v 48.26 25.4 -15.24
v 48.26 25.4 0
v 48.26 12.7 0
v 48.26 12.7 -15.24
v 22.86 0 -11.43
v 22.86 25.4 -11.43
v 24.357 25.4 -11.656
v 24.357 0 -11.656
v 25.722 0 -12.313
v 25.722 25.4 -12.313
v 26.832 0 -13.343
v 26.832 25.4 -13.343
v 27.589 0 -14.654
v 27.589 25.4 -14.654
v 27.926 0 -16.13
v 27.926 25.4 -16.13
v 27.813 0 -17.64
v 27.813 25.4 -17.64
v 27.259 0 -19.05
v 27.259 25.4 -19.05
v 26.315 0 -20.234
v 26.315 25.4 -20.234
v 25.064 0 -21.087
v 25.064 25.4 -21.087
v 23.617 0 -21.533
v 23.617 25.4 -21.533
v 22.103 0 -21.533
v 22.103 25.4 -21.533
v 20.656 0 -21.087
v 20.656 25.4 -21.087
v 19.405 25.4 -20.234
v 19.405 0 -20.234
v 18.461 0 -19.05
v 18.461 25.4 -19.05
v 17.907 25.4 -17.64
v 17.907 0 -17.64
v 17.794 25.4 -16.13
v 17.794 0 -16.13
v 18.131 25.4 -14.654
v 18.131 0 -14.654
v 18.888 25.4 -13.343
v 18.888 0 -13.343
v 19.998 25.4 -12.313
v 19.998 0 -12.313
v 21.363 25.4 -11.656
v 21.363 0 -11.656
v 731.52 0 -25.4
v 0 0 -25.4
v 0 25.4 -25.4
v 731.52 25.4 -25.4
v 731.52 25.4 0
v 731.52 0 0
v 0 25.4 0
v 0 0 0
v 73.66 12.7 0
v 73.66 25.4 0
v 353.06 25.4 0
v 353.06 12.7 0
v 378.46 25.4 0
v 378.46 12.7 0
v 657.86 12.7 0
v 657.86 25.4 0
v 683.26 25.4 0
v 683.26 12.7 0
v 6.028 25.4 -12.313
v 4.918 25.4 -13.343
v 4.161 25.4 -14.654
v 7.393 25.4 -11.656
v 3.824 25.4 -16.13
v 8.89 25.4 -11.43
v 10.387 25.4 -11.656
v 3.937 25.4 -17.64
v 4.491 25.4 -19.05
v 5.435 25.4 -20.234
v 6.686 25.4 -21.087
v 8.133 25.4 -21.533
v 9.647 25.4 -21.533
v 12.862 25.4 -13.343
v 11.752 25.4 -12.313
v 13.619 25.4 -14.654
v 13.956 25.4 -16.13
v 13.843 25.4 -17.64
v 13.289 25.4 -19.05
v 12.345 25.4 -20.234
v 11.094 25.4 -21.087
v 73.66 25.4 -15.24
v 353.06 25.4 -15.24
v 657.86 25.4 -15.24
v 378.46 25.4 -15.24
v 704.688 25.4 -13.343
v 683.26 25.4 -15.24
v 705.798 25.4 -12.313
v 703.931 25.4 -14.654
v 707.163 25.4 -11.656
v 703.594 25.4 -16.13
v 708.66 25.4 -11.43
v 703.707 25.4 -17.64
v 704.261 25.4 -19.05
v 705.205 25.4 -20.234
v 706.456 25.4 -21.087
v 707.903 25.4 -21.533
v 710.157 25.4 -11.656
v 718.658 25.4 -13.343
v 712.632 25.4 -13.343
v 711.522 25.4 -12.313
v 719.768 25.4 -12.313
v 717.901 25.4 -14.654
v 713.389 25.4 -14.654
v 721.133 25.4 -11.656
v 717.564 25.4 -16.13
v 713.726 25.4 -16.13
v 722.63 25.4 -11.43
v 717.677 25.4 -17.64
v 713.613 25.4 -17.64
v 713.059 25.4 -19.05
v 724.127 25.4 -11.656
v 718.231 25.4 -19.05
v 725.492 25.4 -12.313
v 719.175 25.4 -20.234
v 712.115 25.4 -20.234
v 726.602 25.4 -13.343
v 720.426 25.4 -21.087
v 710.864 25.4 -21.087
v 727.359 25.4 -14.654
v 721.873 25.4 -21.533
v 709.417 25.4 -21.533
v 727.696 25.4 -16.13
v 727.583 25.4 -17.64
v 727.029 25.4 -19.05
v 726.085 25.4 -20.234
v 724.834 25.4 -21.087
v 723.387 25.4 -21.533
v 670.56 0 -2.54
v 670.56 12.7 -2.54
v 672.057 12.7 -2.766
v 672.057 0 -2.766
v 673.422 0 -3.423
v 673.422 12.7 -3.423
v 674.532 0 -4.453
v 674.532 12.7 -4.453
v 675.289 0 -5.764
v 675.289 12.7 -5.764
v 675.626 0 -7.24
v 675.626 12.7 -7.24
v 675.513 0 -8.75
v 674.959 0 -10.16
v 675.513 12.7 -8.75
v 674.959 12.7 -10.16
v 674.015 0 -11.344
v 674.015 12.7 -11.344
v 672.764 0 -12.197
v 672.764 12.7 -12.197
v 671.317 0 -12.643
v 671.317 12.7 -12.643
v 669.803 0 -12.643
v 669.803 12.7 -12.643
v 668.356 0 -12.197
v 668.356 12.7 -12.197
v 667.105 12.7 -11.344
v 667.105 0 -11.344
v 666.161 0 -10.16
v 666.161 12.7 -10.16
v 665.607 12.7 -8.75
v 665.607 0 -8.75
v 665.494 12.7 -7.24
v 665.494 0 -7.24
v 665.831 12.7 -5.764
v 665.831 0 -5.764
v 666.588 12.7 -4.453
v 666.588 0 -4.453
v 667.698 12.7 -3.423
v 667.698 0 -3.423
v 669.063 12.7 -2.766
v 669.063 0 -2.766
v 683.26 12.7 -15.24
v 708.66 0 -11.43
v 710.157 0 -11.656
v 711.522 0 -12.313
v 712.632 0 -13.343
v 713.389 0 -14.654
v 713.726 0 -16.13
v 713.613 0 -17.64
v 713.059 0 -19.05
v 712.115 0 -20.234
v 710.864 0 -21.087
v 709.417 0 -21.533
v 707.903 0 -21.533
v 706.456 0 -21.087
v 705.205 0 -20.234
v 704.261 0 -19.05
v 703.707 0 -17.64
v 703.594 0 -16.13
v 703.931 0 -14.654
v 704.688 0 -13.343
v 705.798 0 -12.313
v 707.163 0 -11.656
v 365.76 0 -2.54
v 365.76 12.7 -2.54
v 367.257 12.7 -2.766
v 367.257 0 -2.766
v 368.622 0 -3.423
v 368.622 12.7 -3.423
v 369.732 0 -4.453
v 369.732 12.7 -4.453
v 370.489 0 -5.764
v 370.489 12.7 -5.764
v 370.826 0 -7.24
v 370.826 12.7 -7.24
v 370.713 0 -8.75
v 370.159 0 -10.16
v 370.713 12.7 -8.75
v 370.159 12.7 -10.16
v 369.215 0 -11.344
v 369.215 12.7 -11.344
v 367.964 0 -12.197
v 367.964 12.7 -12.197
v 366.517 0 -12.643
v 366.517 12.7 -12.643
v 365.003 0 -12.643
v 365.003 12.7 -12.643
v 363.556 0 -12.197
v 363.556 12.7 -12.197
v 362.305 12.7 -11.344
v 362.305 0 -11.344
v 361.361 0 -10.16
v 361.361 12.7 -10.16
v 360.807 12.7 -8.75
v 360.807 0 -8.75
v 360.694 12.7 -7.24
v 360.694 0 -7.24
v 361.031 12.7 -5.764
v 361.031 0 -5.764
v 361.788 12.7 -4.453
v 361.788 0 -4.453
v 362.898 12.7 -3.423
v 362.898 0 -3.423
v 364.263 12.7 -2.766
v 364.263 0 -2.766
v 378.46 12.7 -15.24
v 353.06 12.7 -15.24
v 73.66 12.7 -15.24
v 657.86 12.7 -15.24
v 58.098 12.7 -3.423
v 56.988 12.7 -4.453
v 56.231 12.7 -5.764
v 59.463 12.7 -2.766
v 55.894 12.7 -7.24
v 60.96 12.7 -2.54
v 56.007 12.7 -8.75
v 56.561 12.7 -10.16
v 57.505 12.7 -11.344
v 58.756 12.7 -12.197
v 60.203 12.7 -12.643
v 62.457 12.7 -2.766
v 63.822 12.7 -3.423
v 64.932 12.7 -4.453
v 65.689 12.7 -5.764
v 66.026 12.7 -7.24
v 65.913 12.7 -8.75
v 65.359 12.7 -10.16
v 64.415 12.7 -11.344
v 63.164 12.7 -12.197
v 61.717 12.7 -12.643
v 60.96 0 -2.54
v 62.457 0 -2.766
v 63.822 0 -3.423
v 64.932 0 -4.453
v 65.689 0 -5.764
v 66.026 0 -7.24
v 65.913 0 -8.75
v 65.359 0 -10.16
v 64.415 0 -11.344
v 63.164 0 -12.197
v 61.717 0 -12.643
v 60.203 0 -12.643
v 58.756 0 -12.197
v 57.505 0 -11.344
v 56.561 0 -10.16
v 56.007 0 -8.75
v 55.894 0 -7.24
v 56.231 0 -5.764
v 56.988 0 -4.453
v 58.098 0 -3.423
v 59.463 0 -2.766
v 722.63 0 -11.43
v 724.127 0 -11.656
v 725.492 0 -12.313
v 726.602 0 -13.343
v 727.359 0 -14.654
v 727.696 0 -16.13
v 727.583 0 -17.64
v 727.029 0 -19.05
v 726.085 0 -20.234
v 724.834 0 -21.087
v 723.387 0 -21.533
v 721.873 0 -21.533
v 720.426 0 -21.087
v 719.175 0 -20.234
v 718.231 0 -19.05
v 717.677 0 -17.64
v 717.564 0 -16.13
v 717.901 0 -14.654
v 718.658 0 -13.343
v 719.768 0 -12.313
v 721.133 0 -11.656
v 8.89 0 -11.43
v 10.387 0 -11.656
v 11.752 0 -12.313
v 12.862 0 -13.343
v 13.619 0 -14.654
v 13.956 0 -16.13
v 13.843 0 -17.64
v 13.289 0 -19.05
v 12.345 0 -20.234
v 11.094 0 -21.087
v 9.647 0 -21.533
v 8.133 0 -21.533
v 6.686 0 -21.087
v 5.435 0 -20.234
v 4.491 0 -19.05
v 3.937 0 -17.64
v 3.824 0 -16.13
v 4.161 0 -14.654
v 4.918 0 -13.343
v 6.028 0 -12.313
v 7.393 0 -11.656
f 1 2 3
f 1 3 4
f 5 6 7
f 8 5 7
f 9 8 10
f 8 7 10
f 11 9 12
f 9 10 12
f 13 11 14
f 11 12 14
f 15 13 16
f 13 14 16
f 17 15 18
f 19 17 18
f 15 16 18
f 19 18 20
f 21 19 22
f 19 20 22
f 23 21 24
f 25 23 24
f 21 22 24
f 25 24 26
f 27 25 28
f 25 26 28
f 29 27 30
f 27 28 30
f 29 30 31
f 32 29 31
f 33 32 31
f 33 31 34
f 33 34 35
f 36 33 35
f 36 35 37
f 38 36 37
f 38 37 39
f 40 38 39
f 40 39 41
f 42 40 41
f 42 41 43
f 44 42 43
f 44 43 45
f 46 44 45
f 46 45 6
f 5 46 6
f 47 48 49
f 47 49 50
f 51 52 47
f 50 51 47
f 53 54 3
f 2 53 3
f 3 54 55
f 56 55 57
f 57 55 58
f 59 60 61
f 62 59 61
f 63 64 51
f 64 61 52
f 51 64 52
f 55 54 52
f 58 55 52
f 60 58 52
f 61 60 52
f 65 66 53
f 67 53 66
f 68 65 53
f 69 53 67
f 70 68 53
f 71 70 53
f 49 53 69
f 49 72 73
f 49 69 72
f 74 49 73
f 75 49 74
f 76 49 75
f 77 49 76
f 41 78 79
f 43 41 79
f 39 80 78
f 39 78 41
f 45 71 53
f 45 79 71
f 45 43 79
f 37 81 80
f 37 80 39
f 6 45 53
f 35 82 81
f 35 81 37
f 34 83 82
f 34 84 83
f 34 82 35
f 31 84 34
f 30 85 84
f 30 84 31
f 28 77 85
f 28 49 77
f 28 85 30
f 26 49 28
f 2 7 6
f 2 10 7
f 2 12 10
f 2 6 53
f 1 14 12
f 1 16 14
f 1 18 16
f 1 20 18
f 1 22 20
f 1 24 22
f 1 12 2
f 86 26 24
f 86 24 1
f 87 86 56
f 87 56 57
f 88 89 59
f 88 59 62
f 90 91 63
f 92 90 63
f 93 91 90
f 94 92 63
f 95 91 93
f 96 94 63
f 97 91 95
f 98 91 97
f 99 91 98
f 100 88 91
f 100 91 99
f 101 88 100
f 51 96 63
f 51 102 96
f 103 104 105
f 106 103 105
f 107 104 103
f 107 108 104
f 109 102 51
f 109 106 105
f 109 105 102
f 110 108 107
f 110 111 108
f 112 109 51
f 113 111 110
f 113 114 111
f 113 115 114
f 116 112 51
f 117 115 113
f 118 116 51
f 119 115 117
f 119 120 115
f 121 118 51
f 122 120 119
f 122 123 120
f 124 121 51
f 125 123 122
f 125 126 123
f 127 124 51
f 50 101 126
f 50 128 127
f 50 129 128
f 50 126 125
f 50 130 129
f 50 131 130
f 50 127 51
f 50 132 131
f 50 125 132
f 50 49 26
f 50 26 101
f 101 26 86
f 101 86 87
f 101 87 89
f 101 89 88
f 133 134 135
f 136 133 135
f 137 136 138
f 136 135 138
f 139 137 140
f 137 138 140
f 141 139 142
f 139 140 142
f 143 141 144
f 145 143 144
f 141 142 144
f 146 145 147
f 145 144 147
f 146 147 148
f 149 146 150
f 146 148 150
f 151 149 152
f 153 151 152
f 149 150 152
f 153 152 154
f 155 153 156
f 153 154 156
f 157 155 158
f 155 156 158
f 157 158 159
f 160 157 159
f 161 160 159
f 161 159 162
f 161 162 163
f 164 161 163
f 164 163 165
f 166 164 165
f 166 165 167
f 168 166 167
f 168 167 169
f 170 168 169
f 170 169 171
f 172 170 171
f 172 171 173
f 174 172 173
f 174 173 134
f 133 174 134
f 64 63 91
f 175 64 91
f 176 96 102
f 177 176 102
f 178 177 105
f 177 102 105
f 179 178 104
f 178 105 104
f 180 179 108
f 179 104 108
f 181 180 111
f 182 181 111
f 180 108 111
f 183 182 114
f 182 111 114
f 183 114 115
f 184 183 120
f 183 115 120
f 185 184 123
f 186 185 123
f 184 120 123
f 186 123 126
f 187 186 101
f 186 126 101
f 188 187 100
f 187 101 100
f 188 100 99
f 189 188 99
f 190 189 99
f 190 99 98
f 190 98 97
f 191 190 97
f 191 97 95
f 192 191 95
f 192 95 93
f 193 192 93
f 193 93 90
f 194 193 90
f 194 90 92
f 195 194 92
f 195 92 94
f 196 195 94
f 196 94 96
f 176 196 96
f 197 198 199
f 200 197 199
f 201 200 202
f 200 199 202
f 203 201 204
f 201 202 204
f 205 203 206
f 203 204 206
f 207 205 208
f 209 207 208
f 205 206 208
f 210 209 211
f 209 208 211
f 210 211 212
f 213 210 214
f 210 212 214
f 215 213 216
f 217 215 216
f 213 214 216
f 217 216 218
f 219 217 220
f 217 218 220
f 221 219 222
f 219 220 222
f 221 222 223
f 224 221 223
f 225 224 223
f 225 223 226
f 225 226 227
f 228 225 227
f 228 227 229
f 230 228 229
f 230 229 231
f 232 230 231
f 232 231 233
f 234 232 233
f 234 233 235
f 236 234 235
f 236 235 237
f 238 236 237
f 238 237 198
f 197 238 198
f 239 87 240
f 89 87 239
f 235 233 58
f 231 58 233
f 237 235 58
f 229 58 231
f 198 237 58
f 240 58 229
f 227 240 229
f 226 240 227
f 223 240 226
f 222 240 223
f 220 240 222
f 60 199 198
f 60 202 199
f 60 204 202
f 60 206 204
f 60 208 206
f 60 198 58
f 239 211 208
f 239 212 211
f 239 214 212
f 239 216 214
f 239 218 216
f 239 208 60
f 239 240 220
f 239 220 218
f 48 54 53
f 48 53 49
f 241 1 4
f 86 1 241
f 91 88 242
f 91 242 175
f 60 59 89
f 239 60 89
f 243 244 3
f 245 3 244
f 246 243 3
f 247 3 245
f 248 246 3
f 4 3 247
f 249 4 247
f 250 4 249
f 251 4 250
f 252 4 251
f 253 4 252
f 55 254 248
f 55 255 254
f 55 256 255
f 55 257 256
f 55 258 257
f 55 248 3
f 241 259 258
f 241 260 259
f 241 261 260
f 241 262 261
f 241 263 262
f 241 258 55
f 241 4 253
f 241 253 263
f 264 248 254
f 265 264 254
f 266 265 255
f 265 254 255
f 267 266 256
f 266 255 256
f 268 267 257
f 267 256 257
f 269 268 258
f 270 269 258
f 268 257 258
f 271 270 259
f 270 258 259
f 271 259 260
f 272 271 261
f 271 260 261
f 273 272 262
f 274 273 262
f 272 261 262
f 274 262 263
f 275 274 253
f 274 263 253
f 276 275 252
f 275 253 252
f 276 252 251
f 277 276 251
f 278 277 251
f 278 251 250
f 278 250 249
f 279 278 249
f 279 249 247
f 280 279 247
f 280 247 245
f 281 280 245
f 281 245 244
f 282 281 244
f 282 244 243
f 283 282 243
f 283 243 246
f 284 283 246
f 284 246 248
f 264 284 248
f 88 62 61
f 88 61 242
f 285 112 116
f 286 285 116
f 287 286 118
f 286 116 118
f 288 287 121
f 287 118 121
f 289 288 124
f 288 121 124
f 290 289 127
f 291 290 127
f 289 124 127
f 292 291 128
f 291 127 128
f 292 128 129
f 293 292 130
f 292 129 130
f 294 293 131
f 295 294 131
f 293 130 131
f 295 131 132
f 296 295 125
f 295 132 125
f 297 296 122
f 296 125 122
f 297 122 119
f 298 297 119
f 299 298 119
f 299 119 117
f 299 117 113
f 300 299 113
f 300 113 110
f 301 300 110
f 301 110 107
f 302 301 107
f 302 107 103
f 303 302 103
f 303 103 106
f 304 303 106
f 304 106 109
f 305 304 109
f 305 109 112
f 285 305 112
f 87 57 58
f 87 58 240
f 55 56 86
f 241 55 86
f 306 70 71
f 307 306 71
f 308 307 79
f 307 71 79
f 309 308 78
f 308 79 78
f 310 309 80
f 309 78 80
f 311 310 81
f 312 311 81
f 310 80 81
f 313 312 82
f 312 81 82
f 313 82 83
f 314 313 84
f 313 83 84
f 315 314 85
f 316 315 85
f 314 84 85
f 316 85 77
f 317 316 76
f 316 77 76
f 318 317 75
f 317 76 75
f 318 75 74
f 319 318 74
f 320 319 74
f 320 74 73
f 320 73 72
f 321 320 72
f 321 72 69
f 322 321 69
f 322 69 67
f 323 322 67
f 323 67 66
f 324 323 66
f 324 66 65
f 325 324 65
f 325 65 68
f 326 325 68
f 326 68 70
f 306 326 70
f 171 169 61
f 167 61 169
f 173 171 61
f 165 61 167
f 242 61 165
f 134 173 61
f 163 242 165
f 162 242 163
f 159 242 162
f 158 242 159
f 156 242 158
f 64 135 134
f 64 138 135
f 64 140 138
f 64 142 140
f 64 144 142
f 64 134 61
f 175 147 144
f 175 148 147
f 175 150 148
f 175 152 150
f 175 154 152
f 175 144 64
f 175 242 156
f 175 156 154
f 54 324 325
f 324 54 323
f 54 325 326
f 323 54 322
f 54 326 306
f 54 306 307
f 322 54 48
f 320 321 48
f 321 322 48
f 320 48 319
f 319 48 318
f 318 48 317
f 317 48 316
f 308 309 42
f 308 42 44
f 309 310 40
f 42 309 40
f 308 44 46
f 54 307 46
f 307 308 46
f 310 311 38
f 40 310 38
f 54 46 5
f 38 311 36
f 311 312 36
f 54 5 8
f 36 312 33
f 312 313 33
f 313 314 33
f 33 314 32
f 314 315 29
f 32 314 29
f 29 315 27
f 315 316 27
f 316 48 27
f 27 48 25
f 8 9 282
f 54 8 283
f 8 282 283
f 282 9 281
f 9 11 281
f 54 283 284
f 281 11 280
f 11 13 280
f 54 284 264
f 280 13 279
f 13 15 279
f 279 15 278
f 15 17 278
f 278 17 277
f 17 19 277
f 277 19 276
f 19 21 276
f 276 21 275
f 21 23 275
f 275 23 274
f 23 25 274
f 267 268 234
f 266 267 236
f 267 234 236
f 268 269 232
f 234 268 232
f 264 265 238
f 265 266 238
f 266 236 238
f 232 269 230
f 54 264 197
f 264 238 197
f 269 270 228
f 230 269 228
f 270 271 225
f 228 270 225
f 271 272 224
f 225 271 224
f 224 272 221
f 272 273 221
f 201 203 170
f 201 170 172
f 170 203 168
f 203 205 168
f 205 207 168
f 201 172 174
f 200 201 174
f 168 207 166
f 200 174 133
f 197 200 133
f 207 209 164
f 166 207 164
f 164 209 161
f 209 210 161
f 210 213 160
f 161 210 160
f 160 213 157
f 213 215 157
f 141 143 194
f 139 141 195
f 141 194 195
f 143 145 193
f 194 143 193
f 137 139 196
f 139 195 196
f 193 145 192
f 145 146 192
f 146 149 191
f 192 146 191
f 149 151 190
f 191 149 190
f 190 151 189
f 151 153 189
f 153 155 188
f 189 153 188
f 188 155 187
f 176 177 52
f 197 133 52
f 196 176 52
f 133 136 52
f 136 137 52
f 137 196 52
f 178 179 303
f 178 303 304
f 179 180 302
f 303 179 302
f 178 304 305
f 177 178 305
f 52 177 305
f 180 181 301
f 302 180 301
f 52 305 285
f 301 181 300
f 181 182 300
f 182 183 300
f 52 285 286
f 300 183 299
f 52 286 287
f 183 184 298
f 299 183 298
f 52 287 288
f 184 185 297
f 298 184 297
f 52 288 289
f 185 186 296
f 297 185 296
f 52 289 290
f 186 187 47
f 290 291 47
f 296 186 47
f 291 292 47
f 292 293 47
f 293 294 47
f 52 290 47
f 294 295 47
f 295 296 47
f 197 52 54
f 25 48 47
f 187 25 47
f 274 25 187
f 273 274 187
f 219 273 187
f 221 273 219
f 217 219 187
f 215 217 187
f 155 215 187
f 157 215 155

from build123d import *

# Parameters (mm, degrees)
SKETCH1_W           = 731.52
SKETCH1_H           = 25.4
BOSS_EXTRUDE1_DEPTH = 25.4
SKETCH2_R           = 5.08
CUT_EXTRUDE1_DEPTH  = 27.94
SKETCH3_W           = 25.4
SKETCH3_H           = 15.24
CUT_EXTRUDE2_DEPTH  = 12.7
SKETCH4_R           = 5.08
CUT_EXTRUDE3_DEPTH  = 15.24


with BuildPart() as part:
    # Sketch1 → Boss-Extrude1 (new body)
    with BuildSketch(Plane(origin=(0, 0, 0), x_dir=(1, 0, 0), z_dir=(0, 1, 0))):
        with Locations((365.76, 12.7)):
            Rectangle(SKETCH1_W, SKETCH1_H)
    extrude(amount=BOSS_EXTRUDE1_DEPTH)

    # Sketch2 → Cut-Extrude1 (cut)
    with BuildSketch(Plane(origin=(0, 25.4, 0), x_dir=(1, 0, 0), z_dir=(0, 1, 0))):
        with Locations(Location((8.89, 16.51, 0), (0, 0, 270))):
            Circle(SKETCH2_R)
        with Locations(Location((22.86, 16.51, 0), (0, 0, 270))):
            Circle(SKETCH2_R)
        with Locations(Location((722.63, 16.51, 0), (0, 0, 270))):
            Circle(SKETCH2_R)
        with Locations(Location((708.66, 16.51, 0), (0, 0, 270))):
            Circle(SKETCH2_R)
    extrude(amount=-CUT_EXTRUDE1_DEPTH, mode=Mode.SUBTRACT)

    # Sketch3 → Cut-Extrude2 (cut)
    with BuildSketch(Plane(origin=(0, 25.4, 0), x_dir=(1, 0, 0), z_dir=(0, 1, 0))):
        with Locations((60.96, 7.62)):
            Rectangle(SKETCH3_W, SKETCH3_H)
        with Locations((670.56, 7.62)):
            Rectangle(SKETCH3_W, SKETCH3_H)
        with Locations((365.76, 7.62)):
            Rectangle(SKETCH3_W, SKETCH3_H)
    extrude(amount=-CUT_EXTRUDE2_DEPTH, mode=Mode.SUBTRACT)

    # Sketch4 → Cut-Extrude3 (cut)
    with BuildSketch(Plane(origin=(0, 12.7, 0), x_dir=(1, 0, 0), z_dir=(0, 1, 0))):
        with Locations(Location((60.96, 7.62, 0), (0, 0, 270))):
            Circle(SKETCH4_R)
        with Locations(Location((670.56, 7.62, 0), (0, 0, 270))):
            Circle(SKETCH4_R)
        with Locations(Location((365.76, 7.62, 0), (0, 0, 270))):
            Circle(SKETCH4_R)
    extrude(amount=-CUT_EXTRUDE3_DEPTH, mode=Mode.SUBTRACT)


solid = part.part
